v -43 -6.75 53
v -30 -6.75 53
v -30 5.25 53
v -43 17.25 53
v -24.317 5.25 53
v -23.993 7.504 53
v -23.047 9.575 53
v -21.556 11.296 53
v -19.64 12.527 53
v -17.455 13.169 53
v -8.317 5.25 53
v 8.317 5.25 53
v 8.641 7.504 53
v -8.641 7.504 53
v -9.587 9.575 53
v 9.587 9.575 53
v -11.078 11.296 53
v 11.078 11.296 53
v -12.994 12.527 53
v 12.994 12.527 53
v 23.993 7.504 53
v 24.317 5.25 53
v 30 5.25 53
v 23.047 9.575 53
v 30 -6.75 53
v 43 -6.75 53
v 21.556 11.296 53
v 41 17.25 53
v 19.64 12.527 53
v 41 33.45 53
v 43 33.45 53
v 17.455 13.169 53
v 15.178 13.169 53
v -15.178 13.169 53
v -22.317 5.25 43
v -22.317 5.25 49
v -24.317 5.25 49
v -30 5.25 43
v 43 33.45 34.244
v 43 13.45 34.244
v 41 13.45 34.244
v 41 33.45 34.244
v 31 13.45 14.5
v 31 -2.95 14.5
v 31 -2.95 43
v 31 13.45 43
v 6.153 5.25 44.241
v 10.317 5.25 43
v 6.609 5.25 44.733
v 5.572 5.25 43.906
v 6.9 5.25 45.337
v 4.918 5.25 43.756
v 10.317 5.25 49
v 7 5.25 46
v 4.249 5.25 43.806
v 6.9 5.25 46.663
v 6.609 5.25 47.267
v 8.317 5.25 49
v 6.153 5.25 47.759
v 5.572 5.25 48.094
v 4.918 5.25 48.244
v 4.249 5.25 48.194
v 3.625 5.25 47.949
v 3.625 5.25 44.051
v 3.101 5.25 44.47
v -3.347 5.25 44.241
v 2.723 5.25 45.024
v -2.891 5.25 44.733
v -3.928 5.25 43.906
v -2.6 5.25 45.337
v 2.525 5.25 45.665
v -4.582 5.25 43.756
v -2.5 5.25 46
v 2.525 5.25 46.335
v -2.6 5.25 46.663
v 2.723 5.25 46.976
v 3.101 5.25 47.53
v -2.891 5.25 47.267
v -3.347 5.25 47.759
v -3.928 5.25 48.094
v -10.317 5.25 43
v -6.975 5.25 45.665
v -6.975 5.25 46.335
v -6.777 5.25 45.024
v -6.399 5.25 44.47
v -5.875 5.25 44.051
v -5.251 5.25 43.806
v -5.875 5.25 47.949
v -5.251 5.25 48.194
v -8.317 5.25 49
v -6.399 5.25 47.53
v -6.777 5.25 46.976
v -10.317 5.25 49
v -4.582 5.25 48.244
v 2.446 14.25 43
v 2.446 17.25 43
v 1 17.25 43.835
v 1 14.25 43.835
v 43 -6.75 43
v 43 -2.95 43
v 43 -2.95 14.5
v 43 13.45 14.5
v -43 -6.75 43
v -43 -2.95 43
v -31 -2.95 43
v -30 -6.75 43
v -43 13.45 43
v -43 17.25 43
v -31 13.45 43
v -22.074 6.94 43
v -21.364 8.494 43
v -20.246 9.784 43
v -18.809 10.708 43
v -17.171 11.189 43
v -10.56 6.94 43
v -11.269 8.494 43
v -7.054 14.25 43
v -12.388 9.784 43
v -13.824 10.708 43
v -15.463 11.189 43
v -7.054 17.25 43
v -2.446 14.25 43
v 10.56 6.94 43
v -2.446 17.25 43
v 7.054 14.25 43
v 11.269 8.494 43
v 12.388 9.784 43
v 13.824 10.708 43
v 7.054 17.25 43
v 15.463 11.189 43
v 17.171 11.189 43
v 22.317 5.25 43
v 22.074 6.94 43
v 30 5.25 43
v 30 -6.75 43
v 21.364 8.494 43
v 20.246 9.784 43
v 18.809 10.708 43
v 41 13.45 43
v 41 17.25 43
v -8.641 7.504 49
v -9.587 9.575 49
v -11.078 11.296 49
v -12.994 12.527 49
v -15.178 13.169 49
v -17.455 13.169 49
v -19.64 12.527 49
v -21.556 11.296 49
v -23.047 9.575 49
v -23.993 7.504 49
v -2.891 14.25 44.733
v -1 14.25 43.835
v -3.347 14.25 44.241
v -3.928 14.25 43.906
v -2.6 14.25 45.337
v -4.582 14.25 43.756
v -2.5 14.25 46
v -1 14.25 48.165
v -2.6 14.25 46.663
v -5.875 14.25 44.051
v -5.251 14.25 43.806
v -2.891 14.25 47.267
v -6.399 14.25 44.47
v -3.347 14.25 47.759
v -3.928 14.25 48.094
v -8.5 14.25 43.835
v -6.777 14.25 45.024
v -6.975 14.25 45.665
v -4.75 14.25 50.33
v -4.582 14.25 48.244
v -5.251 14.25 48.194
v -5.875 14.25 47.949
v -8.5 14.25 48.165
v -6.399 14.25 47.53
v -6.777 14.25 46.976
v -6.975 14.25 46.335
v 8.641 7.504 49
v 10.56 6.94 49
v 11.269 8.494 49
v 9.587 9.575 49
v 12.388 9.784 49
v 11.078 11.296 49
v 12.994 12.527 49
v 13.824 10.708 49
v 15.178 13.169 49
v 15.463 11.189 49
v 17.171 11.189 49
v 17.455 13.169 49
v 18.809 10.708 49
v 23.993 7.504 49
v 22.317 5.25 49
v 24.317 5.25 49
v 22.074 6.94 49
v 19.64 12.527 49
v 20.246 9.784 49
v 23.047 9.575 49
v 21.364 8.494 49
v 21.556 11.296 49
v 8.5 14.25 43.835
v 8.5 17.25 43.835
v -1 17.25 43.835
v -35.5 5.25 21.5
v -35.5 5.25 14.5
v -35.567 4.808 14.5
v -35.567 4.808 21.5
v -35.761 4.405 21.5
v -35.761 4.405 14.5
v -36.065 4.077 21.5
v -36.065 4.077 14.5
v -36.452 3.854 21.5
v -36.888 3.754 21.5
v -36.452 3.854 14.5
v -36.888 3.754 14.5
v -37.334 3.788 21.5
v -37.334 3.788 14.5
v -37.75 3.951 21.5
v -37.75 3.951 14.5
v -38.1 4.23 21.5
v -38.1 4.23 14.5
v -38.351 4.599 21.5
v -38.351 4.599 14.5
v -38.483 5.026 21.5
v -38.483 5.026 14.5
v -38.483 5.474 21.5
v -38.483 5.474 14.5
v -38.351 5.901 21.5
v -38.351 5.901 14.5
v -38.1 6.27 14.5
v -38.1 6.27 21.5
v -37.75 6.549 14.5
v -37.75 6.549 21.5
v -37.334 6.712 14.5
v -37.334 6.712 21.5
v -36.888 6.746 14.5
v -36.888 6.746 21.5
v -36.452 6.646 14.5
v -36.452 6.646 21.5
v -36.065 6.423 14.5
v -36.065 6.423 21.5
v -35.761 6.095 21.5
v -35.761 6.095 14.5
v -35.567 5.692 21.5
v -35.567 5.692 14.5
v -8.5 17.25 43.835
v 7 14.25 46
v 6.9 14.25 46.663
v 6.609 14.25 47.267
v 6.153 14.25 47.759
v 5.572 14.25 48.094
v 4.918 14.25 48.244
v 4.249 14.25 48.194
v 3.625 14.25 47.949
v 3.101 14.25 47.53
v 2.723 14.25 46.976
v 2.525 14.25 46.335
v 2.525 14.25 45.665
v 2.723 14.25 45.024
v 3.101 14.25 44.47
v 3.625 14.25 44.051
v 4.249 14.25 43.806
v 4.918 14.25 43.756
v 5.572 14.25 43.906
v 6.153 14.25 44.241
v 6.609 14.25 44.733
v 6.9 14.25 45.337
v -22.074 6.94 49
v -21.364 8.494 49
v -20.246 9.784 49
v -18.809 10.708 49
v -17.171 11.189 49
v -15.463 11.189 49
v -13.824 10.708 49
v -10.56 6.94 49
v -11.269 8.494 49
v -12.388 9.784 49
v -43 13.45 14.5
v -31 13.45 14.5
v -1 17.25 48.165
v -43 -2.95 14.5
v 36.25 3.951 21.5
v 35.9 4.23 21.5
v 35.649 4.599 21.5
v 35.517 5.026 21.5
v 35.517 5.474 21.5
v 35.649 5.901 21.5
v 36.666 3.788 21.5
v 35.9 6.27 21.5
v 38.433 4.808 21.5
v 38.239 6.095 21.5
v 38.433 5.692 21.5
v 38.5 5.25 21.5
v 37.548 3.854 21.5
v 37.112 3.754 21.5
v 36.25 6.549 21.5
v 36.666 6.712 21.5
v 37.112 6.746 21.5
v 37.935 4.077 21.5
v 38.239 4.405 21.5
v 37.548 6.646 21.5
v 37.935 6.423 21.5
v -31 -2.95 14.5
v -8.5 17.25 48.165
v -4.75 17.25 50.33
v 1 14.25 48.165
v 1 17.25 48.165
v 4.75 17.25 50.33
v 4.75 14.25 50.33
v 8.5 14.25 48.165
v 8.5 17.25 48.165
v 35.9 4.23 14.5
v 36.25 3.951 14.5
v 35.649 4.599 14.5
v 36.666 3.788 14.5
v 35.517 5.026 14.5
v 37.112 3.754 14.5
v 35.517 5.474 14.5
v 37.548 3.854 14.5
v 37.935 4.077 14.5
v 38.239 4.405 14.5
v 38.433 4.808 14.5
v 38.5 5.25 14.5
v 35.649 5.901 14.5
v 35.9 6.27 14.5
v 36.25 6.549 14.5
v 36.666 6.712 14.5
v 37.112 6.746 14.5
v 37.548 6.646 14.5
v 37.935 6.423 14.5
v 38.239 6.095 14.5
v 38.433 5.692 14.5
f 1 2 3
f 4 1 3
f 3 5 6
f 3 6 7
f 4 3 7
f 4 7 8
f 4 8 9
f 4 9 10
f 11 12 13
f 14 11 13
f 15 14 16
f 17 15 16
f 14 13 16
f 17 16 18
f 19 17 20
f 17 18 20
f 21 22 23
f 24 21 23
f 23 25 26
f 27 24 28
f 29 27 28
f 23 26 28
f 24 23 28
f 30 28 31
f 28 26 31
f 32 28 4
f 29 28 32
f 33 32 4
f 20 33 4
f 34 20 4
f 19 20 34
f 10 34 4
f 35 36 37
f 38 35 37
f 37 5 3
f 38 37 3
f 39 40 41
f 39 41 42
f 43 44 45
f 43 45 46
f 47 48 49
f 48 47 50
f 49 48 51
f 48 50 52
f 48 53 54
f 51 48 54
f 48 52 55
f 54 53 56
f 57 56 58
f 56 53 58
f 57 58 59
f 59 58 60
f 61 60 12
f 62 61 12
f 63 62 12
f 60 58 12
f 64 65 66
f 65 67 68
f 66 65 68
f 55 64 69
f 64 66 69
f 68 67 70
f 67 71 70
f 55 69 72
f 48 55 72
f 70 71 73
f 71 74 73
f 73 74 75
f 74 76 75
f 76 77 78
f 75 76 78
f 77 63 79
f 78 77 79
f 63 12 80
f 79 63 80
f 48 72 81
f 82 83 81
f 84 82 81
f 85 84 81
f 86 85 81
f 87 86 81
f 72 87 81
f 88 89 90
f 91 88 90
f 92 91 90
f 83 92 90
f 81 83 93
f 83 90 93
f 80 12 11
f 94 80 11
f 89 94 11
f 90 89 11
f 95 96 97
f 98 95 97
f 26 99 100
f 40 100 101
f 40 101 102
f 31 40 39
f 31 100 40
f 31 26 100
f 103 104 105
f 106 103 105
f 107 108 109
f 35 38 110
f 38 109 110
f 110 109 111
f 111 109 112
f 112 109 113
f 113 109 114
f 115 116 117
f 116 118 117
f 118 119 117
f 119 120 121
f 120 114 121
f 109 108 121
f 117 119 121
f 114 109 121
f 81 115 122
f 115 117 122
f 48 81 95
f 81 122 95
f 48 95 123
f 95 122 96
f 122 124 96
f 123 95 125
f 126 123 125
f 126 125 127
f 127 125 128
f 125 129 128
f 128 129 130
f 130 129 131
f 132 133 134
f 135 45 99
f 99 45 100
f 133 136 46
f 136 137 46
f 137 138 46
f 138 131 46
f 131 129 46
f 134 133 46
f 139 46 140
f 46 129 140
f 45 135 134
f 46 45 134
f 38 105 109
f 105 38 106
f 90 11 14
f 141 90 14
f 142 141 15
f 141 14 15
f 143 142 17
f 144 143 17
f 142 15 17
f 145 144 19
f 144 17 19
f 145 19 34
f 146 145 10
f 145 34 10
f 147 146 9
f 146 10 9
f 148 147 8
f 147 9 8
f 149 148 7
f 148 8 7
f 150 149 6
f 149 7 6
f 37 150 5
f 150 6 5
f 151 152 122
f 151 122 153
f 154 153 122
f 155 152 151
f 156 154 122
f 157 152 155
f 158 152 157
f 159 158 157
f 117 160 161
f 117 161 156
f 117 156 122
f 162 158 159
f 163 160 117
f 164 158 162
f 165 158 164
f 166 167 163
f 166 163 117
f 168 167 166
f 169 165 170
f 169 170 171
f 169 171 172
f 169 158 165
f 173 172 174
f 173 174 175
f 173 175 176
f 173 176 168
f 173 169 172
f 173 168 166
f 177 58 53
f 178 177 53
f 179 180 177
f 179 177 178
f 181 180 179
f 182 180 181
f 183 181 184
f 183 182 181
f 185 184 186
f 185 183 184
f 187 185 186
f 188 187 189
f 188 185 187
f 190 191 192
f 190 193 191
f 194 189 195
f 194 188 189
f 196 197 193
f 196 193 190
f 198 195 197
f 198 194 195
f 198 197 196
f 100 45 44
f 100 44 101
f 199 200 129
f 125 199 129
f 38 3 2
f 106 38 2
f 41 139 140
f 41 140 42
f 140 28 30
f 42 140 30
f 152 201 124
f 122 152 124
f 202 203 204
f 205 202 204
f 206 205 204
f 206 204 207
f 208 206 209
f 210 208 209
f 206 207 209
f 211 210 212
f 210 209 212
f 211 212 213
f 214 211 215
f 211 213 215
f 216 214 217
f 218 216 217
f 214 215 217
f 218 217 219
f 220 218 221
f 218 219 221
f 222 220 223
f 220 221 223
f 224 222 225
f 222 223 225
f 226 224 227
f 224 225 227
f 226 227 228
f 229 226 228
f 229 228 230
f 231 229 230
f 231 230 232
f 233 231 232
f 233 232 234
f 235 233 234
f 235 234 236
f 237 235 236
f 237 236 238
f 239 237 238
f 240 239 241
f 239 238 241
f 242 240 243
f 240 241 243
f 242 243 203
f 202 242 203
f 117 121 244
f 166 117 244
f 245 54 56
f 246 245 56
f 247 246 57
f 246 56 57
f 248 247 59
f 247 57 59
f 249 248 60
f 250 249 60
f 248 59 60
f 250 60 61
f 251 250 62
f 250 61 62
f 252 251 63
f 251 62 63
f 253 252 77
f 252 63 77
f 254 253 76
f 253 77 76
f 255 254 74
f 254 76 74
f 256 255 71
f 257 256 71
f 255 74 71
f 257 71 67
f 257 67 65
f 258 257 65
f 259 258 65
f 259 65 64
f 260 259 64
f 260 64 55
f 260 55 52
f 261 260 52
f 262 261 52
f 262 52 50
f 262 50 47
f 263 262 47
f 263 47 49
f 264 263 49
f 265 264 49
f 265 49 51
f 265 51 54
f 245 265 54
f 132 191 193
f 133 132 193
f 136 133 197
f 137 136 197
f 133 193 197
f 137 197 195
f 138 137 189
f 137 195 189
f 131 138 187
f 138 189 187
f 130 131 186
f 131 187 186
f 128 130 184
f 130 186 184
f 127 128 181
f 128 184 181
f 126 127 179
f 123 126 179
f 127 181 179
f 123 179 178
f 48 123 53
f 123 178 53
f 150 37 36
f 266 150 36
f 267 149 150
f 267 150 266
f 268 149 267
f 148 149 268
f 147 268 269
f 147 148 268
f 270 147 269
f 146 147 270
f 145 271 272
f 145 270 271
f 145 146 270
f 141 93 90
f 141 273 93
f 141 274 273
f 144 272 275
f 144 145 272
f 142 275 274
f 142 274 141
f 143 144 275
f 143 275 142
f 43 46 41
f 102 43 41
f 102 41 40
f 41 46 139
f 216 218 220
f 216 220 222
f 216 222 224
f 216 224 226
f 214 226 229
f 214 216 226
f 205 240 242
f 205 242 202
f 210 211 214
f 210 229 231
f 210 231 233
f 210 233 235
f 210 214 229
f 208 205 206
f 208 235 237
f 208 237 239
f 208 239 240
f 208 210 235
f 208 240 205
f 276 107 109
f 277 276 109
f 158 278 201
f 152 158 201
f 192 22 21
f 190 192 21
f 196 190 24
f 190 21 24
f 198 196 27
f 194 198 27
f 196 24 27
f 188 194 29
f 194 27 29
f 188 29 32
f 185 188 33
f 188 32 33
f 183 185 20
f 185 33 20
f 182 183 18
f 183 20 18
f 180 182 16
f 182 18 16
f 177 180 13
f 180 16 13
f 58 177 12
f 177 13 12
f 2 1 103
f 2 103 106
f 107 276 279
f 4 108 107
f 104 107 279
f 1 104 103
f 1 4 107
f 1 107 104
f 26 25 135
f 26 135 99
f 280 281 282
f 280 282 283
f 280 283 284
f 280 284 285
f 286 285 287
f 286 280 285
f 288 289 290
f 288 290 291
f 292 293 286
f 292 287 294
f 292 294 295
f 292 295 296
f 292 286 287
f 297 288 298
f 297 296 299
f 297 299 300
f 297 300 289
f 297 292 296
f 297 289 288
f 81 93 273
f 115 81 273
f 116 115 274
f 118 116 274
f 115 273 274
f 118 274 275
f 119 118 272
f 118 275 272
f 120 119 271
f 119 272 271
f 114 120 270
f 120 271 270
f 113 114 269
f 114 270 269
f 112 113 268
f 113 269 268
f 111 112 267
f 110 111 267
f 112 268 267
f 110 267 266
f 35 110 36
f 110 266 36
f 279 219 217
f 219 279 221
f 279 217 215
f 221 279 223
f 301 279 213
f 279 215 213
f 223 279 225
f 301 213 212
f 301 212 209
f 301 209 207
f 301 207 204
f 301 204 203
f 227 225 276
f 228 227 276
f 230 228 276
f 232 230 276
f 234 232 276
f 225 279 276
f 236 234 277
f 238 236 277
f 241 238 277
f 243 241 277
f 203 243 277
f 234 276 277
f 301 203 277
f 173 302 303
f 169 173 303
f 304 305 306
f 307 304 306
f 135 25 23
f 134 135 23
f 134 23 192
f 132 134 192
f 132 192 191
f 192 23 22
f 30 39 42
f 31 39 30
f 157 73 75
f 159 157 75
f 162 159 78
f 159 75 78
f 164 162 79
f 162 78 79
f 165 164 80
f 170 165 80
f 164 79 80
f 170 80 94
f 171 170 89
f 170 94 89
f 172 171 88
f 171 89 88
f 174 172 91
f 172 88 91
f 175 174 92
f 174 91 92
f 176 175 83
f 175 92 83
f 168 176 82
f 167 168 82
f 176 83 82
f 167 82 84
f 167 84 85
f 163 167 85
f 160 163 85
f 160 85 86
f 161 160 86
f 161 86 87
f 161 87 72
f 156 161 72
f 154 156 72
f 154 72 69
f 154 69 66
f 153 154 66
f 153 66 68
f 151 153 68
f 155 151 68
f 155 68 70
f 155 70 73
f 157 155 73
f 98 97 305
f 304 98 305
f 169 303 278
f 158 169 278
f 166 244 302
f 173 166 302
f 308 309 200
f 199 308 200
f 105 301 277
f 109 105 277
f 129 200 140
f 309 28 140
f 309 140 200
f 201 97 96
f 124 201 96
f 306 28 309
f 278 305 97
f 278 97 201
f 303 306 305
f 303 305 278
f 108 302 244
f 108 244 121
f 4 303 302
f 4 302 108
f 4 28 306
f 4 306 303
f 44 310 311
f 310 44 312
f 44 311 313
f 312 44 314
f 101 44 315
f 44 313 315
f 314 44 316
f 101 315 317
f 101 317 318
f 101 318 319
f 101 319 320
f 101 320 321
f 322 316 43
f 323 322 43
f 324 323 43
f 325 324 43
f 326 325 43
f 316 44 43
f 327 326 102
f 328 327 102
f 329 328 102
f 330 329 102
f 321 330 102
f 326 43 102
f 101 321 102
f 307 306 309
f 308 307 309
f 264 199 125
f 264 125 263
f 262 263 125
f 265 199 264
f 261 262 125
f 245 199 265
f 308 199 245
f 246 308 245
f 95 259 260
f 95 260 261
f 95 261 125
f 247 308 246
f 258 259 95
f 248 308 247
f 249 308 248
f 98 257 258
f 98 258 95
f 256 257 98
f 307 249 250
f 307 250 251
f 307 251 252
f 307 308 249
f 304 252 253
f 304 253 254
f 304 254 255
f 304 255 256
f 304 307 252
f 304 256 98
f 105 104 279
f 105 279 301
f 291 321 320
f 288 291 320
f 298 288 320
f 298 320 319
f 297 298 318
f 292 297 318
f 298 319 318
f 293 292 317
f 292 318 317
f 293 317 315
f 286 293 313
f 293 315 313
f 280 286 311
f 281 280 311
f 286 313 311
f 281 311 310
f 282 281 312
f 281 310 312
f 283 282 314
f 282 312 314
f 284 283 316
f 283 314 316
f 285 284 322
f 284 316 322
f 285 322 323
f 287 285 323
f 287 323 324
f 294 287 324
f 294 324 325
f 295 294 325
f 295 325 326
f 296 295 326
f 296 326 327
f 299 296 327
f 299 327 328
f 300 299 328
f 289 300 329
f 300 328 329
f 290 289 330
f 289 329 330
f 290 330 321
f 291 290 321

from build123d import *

# Parameters (mm, degrees)
F0_W          = 12
F0_H          = 16.5
F0_R          = 1.6
F1_DEPTH      = 17.5
F5_W          = 12
F5_H          = 16.5
F6_DEPTH      = 3
F2_W          = 12
F2_H          = 16.4
F7_DEPTH      = 35.5
F7_DEPTH_BACK = 3
F11_W         = 50
F11_H         = 5.5
F12_DEPTH     = 90
F14_DEPTH     = 10
F15_R         = 1.5
F16_DEPTH     = 7
F17_R         = 8
F18_DEPTH     = 15
F22_R         = 8
F22_R_2       = 6
F23_DEPTH     = 6
F25_DEPTH     = 25
F26_R         = 2.25
F27_DEPTH     = 25
F28_R         = 2.25
F29_DEPTH     = 3
F30_W         = 20
F30_H         = 18.7556861639
F31_DEPTH     = 2


# Not quite as in the source:
# - a feature of the source that left no trace in its solid (it failed there, or was rolled back) is left out


with BuildPart() as f1:
    # F0 (on Top) → F1 (new body)
    with BuildSketch(Plane.XY):
        Polygon((-43, -44.5), (43, -44.5), (43, -3), (31, -3), (31, -11.5), (-31, -11.5), (-31, -3), (-43, -3), align=None)
        with Locations((37, 5.25)):
            Rectangle(F0_W, F0_H)
        with Locations((37, 5.25)):
            Circle(F0_R, mode=Mode.SUBTRACT)
        with Locations((-37, 5.25)):
            Rectangle(F0_W, F0_H)
        with Locations((-37, 5.25)):
            Circle(F0_R, mode=Mode.SUBTRACT)
        Polygon((31, 13.5), (43, 13.5), (43, 44.5), (-43, 44.5), (-43, 13.5), (-31, 13.5), (-31, 25.5), (31, 25.5), align=None)
    extrude(amount=F1_DEPTH)

    # F5 (on face) → F6 (cut)
    with BuildSketch(Plane.XY.offset(17.5)):
        with Locations((-37, 5.25)):
            Rectangle(F5_W, F5_H)
        with Locations((37, 5.25)):
            Rectangle(F5_W, F5_H)
    extrude(amount=-F6_DEPTH, mode=Mode.SUBTRACT)

    # F11 (on face) → F12 (cut)
    with BuildSketch(Plane(origin=(-43, 0, 0), x_dir=(0, -1, 0), z_dir=(-1, 0, 0))):
        with Locations((0, 2.75)):
            Rectangle(F11_W, F11_H)
    extrude(amount=-F12_DEPTH, mode=Mode.SUBTRACT)


with BuildPart() as f7:
    # F2 (on face) → F7 (new body, two sides)
    with BuildSketch(Plane.XY.offset(17.5)) as f7_sk:
        with Locations((37, 5.25)):
            Rectangle(F2_W, F2_H)
    extrude(amount=F7_DEPTH)
    extrude(f7_sk.sketch, amount=-F7_DEPTH_BACK)



with BuildPart() as f7b:
    # F2 (on face) → F7, piece 2 (new body, two sides)
    with BuildSketch(Plane.XY.offset(17.5)) as f7_2_sk:
        with Locations((-37, 5.25)):
            Rectangle(F2_W, F2_H)
    extrude(amount=F7_DEPTH)
    extrude(f7_2_sk.sketch, amount=-F7_DEPTH_BACK)


with BuildPart() as f7_1:
    add(f7.part)

    add(f7b.part)  # F14 merges F7b
    # F13 (on face) → F14 (join)
    with BuildSketch(Plane.XY.offset(53)):
        Polygon((43, -6.75), (43, 13.5), (43, 17.25), (-43, 17.25), (-43, -6.75), align=None)
    extrude(amount=-F14_DEPTH)

    # F15 (on face) → F16 (cut)
    with BuildSketch(Plane(origin=(0, 0, 14.5), x_dir=(1, 0, 0), z_dir=(0, 0, -1))):
        with Locations((-37, -5.25)):
            Circle(F15_R)
        with Locations((37, -5.25)):
            Circle(F15_R)
    extrude(amount=-F16_DEPTH, mode=Mode.SUBTRACT)

    # F17 (on face) → F18 (cut)
    with BuildSketch(Plane.XY.offset(53)):
        with Locations((16.3168814033, 5.25)):
            Circle(F17_R)
        with Locations((-16.3168814033, 5.25)):
            Circle(F17_R)
    extrude(amount=-F18_DEPTH, mode=Mode.SUBTRACT)

    # F22 (on offset) → F23 (join)
    with BuildSketch(Plane.XY.offset(49)):
        with Locations((-16.3168814033, 5.25)):
            Circle(F22_R)
        with Locations((-16.3168814033, 5.25)):
            Circle(F22_R_2, mode=Mode.SUBTRACT)
        with Locations((16.3168814033, 5.25)):
            Circle(F22_R)
        with Locations((16.3168814033, 5.25)):
            Circle(F22_R_2, mode=Mode.SUBTRACT)
    extrude(amount=-F23_DEPTH)

    # F24 (on face) → F25 (cut)
    with BuildSketch(Plane.XY.offset(53)):
        with BuildLine():
            Line((-30, 5.25), (-30, -6.75))
            Line((-30, -6.75), (30, -6.75))
            Line((30, -6.75), (30, 5.25))
            Line((30, 5.25), (-10.3168814033, 5.25))
            ThreePointArc((-10.3168814033, 5.25), (-16.3168814033, -0.75), (-22.3168814033, 5.25))
            Line((-22.3168814033, 5.25), (-30, 5.25))
        make_face()
        with BuildLine():
            ThreePointArc((-10.3168814033, 5.25), (-16.3168814033, 11.25), (-22.3168814033, 5.25))
            Line((-22.3168814033, 5.25), (-10.3168814033, 5.25))
        make_face()
        with BuildLine():
            Line((-10.3168814033, 5.25), (-22.3168814033, 5.25))
            ThreePointArc((-22.3168814033, 5.25), (-16.3168814033, -0.75), (-10.3168814033, 5.25))
        make_face()
    extrude(amount=-F25_DEPTH, mode=Mode.SUBTRACT)

    # F26 (on face) → F27 (cut)
    with BuildSketch(Plane.XZ.offset(-5.25)):
        with Locations((-4.75, 46)):
            Circle(F26_R)
        with Locations((4.75, 46)):
            Circle(F26_R)
    extrude(amount=-F27_DEPTH, mode=Mode.SUBTRACT)

    # F28 (on face) → F29 (cut)
    with BuildSketch(Plane(origin=(0, 17.25, 0), x_dir=(-1, 0, 0), z_dir=(0, 1, 0))):
        Polygon((8.5, 43.8349364905), (8.5, 48.1650635095), (4.75, 50.3301270189), (1, 48.1650635095), (1, 43.8349364905), (4.75, 41.6698729811), align=None)
        with Locations((4.75, 46)):
            Circle(F28_R, mode=Mode.SUBTRACT)
        Polygon((-1, 43.8349364905), (-1, 48.1650635095), (-4.75, 50.3301270189), (-8.5, 48.1650635095), (-8.5, 43.8349364905), (-4.75, 41.6698729811), align=None)
        with Locations((-4.75, 46)):
            Circle(F28_R, mode=Mode.SUBTRACT)
    extrude(amount=-F29_DEPTH, mode=Mode.SUBTRACT)

    # F30 (on face) → F31 (join)
    with BuildSketch(Plane.YZ.offset(43)):
        with Locations((23.45, 43.622156918)):
            Rectangle(F30_W, F30_H)
    extrude(amount=-F31_DEPTH)


solid = f7_1.part
